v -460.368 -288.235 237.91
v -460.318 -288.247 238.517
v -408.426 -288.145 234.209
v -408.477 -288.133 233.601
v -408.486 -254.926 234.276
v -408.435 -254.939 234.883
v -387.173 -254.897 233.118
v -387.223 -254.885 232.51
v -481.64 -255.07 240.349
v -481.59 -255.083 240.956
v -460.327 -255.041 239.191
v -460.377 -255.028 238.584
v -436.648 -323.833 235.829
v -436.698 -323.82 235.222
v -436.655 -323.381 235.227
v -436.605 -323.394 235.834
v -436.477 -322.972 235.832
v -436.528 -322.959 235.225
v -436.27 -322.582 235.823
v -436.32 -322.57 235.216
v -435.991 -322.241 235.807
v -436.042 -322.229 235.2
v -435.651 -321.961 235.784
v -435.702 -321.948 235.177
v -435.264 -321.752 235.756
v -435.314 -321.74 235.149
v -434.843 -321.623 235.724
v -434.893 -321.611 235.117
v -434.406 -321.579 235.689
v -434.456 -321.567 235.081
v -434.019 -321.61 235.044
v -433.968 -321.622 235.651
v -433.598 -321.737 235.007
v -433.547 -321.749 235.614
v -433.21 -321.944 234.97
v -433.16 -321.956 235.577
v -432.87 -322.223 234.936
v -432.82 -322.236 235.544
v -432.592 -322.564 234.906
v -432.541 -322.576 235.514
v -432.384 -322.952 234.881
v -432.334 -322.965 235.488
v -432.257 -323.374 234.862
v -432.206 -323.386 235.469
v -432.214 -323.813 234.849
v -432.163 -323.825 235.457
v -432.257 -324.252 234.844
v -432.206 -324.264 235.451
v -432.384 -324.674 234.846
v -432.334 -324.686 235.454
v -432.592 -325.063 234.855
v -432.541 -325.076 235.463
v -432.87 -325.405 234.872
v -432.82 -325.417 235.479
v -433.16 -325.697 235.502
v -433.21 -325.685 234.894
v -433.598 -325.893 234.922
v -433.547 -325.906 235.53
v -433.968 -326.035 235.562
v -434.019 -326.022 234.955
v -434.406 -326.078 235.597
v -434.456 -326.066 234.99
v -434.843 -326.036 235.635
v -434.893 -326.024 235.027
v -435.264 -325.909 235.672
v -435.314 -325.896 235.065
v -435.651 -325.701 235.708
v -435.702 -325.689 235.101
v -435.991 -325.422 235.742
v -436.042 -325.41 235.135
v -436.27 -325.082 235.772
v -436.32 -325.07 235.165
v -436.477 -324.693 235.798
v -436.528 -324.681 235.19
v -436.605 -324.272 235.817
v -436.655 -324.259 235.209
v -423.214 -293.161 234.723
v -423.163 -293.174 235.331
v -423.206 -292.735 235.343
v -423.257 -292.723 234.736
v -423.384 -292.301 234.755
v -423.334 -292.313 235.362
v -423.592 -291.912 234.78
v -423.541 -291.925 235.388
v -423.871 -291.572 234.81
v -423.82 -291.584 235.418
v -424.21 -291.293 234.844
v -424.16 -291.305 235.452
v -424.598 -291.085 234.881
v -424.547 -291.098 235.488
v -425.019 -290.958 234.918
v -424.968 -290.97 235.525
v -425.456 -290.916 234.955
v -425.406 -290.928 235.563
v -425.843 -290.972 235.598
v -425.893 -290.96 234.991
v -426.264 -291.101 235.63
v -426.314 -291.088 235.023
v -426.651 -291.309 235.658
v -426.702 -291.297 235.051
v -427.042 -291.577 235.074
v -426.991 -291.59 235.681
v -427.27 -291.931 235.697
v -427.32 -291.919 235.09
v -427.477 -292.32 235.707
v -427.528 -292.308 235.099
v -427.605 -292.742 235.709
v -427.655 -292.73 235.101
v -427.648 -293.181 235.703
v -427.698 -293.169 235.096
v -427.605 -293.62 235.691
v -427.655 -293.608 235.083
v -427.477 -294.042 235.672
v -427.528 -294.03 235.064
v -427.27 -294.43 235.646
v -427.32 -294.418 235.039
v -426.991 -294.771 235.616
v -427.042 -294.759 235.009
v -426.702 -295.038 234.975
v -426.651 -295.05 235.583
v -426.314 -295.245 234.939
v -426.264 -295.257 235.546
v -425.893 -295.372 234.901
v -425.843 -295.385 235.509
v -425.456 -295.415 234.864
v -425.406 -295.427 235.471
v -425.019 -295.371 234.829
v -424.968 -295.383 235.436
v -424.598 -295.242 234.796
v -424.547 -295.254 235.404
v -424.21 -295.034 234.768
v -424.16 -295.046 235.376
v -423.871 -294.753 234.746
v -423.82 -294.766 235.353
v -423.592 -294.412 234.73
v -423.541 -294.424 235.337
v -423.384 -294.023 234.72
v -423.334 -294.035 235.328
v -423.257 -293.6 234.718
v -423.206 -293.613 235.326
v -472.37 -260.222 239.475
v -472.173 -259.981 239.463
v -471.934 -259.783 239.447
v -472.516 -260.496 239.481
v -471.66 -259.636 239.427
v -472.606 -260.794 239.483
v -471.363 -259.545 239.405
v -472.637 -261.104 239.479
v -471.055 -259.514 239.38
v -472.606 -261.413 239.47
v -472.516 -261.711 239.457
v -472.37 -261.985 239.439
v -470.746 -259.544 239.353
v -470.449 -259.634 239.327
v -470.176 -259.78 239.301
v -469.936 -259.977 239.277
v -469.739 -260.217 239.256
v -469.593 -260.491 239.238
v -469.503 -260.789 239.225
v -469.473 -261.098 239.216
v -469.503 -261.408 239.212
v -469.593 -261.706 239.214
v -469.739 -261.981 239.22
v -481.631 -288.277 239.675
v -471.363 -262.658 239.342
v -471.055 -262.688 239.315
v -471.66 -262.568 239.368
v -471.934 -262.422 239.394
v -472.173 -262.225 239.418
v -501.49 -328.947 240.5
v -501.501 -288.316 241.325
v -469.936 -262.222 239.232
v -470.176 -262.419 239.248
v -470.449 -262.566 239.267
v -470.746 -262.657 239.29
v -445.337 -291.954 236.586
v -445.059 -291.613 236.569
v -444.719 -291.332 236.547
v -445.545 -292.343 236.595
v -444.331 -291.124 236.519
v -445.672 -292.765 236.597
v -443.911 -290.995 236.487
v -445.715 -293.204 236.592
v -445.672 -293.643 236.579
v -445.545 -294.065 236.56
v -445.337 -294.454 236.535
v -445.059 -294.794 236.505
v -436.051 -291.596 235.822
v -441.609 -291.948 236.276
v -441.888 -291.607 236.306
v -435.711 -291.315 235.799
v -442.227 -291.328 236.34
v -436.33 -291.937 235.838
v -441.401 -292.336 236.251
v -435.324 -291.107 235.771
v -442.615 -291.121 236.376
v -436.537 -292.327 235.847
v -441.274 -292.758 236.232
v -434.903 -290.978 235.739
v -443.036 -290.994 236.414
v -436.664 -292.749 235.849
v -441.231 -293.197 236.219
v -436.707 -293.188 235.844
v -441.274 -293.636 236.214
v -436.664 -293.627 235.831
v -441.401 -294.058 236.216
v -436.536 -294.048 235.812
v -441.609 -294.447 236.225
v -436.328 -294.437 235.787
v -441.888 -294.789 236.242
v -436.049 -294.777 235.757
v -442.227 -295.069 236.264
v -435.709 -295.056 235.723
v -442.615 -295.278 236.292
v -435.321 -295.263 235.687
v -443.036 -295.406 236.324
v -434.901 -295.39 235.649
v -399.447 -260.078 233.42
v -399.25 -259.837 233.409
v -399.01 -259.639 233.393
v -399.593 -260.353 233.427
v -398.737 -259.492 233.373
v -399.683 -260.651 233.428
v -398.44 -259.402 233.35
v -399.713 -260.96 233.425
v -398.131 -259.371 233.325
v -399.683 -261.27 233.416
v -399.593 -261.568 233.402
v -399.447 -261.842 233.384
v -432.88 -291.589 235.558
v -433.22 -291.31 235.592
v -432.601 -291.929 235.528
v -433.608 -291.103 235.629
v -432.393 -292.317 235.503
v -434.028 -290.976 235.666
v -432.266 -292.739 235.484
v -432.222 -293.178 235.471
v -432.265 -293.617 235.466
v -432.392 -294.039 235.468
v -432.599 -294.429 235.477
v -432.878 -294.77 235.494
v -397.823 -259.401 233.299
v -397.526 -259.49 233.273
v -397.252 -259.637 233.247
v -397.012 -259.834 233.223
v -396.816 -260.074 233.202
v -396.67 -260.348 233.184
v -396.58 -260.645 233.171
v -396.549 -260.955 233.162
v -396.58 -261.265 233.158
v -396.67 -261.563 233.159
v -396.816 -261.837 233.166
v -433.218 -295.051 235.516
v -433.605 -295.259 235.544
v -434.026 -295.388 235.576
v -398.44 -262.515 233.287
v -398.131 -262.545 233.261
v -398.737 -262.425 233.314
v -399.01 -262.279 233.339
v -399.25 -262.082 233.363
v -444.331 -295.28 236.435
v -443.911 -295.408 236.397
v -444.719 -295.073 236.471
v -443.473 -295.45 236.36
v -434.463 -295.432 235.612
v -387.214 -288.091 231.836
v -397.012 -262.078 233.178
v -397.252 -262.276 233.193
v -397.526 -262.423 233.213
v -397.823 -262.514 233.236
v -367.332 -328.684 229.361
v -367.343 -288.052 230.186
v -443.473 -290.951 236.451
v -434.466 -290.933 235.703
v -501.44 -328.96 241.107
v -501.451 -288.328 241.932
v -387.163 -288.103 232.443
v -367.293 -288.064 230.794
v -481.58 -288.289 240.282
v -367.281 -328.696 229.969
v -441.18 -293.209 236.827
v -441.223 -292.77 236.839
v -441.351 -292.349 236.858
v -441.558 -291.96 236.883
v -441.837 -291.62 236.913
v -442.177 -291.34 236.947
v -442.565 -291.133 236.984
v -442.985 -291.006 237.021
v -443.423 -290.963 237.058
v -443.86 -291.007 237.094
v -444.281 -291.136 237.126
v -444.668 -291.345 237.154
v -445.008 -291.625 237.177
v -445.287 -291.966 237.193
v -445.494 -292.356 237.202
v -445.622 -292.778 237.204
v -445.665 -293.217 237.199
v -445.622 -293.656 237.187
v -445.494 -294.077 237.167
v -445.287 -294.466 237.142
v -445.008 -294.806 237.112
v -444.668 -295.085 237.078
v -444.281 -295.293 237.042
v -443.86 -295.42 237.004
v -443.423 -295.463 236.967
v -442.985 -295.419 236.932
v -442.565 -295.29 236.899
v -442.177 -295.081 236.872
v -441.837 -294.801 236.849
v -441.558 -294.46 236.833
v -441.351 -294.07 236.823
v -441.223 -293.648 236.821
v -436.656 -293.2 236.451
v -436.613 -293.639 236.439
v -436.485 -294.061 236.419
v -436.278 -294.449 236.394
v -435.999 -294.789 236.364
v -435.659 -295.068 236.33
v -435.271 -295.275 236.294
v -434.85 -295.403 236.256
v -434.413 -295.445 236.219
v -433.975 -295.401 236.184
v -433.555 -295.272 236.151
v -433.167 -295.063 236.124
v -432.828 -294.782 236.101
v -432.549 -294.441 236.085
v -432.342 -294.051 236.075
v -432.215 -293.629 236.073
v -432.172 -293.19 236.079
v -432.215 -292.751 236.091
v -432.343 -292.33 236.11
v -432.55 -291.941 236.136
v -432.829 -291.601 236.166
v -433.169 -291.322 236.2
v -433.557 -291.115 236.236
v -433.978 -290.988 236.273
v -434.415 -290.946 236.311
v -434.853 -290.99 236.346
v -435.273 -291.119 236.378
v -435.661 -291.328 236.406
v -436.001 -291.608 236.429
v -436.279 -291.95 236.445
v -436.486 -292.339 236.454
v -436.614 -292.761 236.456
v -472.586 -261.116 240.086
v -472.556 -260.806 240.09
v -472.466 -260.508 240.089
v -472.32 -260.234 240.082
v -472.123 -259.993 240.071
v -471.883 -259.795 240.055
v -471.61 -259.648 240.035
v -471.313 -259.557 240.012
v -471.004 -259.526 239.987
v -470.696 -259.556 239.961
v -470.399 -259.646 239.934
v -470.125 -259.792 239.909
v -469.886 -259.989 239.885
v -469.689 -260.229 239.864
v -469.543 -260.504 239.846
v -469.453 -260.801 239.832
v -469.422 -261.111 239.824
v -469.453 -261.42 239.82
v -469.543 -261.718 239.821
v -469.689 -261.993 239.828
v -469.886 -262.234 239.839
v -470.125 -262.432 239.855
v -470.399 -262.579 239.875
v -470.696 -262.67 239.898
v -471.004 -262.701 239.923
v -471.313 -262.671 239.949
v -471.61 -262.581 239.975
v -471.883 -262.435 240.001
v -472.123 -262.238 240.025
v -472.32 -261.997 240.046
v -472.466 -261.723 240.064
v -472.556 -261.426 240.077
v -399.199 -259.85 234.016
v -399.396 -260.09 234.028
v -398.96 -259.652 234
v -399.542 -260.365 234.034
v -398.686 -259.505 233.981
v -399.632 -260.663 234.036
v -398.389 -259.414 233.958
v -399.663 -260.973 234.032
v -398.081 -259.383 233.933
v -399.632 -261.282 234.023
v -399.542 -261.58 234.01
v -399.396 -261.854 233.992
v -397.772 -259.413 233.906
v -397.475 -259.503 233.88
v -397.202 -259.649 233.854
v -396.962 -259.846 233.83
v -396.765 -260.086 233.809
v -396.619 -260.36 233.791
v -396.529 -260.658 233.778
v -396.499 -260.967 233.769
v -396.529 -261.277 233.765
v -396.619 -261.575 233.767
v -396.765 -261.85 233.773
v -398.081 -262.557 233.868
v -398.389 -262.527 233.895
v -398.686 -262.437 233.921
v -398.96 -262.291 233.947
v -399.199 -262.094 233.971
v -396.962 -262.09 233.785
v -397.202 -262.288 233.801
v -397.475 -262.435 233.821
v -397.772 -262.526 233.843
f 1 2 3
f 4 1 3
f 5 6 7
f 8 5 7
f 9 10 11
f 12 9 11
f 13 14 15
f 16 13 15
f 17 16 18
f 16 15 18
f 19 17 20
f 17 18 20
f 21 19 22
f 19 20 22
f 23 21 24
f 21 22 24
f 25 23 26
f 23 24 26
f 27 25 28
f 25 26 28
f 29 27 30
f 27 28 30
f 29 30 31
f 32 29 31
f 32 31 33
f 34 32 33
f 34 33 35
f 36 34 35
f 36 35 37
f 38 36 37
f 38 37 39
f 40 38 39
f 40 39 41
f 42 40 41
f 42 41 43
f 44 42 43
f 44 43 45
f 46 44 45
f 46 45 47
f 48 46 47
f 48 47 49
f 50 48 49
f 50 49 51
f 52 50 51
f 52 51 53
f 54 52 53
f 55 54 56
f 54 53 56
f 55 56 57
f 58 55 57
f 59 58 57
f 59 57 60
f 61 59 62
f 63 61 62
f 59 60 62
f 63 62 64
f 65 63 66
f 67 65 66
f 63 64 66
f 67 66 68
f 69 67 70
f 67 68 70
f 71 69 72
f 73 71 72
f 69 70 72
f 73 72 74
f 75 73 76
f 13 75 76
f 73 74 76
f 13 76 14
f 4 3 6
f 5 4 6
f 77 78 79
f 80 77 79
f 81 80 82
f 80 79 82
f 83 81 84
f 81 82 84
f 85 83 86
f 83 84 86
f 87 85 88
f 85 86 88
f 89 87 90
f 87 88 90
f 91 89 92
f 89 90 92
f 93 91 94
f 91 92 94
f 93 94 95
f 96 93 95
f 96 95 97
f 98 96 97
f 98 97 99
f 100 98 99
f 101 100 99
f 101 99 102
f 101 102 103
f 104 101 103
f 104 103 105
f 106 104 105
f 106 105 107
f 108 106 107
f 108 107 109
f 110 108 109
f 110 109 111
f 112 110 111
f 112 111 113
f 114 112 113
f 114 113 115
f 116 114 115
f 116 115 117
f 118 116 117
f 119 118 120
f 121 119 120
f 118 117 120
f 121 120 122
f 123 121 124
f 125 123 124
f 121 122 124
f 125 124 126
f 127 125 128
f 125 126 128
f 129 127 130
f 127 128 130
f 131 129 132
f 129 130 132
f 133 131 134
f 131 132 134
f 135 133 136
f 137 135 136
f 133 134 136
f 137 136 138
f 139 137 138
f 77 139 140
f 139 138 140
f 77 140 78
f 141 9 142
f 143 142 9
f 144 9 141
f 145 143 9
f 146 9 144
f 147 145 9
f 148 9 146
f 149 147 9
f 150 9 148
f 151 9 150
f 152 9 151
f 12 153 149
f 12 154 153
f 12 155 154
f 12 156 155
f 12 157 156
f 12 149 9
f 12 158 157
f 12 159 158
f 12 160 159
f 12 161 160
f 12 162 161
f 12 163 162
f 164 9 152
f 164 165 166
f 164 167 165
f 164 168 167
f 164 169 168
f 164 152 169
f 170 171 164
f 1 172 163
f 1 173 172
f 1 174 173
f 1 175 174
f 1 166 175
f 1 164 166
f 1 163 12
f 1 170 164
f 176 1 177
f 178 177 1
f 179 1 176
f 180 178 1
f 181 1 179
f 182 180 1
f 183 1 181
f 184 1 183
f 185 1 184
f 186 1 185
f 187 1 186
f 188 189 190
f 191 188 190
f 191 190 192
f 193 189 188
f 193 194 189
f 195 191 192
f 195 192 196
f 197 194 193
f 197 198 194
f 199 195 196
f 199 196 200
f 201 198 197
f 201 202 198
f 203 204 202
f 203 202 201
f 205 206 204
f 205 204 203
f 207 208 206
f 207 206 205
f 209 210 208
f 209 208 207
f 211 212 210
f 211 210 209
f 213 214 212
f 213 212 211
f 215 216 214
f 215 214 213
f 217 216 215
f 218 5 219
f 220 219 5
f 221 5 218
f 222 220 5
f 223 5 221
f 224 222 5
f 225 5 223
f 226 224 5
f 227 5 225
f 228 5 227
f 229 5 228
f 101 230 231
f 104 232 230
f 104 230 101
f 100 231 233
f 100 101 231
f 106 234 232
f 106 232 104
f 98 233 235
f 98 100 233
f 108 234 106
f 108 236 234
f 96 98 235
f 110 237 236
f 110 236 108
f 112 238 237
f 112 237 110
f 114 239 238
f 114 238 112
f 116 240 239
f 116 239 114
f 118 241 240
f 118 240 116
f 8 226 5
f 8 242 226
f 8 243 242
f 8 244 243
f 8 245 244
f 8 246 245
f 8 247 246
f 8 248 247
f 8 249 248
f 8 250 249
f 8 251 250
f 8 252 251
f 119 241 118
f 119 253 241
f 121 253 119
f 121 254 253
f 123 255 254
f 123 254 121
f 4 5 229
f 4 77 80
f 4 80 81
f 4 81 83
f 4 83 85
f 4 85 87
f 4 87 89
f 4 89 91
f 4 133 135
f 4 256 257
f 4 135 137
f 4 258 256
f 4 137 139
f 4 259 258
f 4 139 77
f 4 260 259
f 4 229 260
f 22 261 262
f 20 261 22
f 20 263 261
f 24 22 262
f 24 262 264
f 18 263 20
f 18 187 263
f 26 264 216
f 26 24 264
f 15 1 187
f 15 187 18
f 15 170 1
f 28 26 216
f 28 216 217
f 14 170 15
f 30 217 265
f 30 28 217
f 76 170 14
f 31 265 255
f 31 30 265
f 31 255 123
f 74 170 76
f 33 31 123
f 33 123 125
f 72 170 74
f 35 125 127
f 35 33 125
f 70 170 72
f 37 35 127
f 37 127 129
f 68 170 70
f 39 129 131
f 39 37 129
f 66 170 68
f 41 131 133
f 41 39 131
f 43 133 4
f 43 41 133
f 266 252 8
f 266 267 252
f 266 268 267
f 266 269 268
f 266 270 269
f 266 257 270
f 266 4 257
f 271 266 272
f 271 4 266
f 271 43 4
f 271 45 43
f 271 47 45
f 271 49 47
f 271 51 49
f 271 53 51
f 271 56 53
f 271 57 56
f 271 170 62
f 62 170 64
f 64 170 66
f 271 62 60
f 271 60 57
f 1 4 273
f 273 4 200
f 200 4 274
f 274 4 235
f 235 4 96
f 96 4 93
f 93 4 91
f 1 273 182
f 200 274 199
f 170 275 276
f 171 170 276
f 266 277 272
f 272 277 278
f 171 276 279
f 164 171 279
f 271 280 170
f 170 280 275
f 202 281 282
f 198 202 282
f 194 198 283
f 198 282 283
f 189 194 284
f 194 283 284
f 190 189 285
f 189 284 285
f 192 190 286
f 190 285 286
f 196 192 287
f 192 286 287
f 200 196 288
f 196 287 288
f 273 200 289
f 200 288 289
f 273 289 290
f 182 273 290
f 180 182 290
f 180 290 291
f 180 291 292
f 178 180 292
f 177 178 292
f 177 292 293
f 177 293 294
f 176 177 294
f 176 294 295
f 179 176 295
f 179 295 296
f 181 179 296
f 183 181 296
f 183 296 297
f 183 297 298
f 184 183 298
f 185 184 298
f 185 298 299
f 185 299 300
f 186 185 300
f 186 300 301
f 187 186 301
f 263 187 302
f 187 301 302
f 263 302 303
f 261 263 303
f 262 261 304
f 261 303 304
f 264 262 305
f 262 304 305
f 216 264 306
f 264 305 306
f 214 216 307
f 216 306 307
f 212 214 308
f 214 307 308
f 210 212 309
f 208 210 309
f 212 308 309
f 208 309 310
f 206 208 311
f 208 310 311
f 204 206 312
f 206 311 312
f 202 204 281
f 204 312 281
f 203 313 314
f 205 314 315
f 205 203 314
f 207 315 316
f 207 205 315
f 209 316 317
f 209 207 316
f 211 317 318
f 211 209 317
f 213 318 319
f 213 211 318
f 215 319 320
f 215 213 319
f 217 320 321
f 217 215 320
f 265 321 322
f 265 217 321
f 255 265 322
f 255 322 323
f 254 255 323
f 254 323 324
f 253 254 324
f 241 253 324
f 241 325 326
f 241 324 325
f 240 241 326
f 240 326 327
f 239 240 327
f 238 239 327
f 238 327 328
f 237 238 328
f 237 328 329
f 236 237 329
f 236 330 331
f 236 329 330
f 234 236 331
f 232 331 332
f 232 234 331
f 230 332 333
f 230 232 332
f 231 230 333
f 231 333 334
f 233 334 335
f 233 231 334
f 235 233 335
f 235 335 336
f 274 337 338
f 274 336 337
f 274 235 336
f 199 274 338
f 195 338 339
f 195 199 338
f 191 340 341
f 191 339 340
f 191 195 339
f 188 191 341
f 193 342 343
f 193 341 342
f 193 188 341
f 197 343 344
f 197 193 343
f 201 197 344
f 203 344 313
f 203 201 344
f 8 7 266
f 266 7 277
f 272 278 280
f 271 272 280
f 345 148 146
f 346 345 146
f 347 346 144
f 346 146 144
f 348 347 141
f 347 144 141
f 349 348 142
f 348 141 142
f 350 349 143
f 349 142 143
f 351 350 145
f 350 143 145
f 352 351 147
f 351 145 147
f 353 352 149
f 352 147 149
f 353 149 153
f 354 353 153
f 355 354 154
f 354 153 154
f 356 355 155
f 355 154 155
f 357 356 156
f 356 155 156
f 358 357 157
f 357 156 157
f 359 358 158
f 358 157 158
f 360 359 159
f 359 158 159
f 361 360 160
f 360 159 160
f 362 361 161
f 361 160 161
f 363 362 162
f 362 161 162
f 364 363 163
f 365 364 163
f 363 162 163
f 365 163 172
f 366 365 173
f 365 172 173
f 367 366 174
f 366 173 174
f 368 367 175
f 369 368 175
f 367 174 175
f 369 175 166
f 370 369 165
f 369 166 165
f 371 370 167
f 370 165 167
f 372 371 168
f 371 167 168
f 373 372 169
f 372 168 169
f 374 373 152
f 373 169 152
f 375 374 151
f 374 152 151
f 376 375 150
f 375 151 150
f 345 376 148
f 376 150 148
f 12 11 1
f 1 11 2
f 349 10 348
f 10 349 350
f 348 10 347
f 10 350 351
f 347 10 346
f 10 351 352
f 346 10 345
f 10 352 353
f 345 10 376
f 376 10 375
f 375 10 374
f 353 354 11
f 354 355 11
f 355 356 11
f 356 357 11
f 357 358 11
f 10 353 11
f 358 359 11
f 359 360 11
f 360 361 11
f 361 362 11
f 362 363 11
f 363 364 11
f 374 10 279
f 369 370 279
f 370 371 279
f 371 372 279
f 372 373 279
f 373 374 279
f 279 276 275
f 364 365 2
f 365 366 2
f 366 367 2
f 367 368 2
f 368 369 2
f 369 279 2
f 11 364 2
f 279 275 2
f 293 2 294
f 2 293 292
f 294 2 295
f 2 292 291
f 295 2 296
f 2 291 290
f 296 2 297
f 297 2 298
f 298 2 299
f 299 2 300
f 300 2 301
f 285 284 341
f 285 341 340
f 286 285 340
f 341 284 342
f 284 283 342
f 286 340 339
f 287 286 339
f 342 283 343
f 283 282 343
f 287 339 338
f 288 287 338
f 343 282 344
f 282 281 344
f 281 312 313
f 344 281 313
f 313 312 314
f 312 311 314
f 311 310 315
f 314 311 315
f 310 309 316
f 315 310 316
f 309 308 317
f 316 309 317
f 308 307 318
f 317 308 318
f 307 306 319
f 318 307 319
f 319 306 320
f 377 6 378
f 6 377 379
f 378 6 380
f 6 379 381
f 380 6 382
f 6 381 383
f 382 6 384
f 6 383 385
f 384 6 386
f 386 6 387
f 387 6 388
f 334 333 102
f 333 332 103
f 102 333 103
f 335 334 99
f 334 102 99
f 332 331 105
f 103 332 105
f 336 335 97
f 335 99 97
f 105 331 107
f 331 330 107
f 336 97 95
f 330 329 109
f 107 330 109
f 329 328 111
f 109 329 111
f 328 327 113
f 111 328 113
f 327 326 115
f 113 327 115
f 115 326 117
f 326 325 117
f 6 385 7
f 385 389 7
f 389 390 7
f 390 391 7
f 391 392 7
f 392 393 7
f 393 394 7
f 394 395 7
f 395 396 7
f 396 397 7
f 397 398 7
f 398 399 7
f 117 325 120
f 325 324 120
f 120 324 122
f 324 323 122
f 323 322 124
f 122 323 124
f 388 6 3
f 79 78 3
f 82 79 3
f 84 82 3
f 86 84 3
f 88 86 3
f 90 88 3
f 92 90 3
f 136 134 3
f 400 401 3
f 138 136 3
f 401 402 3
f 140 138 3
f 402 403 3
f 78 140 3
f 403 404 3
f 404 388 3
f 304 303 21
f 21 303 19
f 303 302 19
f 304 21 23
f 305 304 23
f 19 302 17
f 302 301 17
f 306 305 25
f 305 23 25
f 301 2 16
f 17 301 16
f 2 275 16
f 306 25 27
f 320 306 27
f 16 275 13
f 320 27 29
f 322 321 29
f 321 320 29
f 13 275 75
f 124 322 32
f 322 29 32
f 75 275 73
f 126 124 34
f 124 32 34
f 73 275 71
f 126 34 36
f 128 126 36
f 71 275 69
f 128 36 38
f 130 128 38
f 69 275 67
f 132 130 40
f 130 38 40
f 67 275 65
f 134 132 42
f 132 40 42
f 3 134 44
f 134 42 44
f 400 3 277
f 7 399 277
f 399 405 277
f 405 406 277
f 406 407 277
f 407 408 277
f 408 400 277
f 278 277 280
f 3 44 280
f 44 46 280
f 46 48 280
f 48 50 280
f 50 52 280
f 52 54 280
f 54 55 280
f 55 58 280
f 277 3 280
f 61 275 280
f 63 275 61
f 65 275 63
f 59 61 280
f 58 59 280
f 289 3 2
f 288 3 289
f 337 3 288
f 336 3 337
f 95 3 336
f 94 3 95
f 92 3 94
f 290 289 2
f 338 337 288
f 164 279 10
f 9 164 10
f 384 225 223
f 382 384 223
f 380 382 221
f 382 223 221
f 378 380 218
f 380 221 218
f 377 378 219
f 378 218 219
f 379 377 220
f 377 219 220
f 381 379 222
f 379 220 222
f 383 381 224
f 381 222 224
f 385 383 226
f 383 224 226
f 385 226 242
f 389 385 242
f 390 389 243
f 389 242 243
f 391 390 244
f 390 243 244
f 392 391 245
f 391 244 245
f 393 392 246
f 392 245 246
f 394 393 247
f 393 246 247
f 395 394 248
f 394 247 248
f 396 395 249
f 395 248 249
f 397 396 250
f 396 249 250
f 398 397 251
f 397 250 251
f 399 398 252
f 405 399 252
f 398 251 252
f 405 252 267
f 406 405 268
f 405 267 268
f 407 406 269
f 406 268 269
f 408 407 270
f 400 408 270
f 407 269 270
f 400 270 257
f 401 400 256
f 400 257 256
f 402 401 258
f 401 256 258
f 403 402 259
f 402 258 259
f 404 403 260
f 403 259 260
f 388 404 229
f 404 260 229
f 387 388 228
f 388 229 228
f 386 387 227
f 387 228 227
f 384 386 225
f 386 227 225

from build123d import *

# Parameters (mm, degrees)
BOSS_EXTRUDE1_DEPTH = 0.6096
SKETCH5_R           = 2.25
CUT_EXTRUDE2_DEPTH  = 430.420105
SKETCH6_R           = 1.5875
CUT_EXTRUDE5_DEPTH  = 0.6096
SKETCH7_R           = 1.5875
CUT_EXTRUDE6_DEPTH  = 0.6096
SKETCH8_R           = 2.25
CUT_EXTRUDE7_DEPTH  = 2.54


with BuildPart() as part:
    # Sketch1 → Boss-Extrude1 (new body)
    with BuildSketch(Plane(origin=(16.997226787, -4.149929847, 204.631375634), x_dir=(0.99656941, 0.00195951, -0.082737969), z_dir=(-0.082760694, 0.020206301, -0.996364578))):
        Polygon((-405.631572024, 283.216979703), (-385.692572024, 283.216979703), (-385.692572024, 323.856979703), (-405.014358213, 323.856979703), (-432.414358217, 323.856979703), (-445.097076418, 323.856979703), (-465.359895626, 323.856979703), (-479.498480719, 323.856979703), (-500.373572024, 323.856979703), (-520.312572024, 323.856979703), (-520.312572024, 283.216979703), (-500.373572024, 283.216979703), (-500.373572024, 250.003685703), (-479.037572024, 250.003685703), (-479.037572024, 283.216979703), (-426.967572024, 283.216979703), (-426.967572024, 250.003685703), (-405.631572024, 250.003685703), align=None)
    extrude(amount=BOSS_EXTRUDE1_DEPTH)

    # Sketch5 → Cut-Extrude2 (cut)
    with BuildSketch(Plane(origin=(16.946775868, -4.137612086, 204.023991787), x_dir=(-0.996569449, -0.001678044, 0.082743681), z_dir=(-0.082760694, 0.020206301, -0.996364578))):
        with Locations((452.956635294, -318.984510283)):
            Circle(SKETCH5_R)
    cut_extrude2 = extrude(amount=-CUT_EXTRUDE2_DEPTH, mode=Mode.SUBTRACT)

    # Mirror1: Cut-Extrude2 across plane
    add(cut_extrude2.mirror(Plane(origin=(0.085159645, -303.474424262, -6.16154314), x_dir=(5.696e-06, -0.020299151, 0.999793951), z_dir=(0.000280558, -0.999793912, -0.020299152))), mode=Mode.SUBTRACT)

    # Sketch6 → Cut-Extrude5 (cut)
    with BuildSketch(Plane(origin=(16.946775868, -4.137612086, 204.023991787), x_dir=(-0.996569449, -0.001678044, 0.082743681), z_dir=(-0.082760694, 0.020206301, -0.996364578))):
        with Locations((416.50680125, -256.173836565)):
            Circle(SKETCH6_R)
    extrude(amount=-CUT_EXTRUDE5_DEPTH, mode=Mode.SUBTRACT)

    # Sketch7 → Cut-Extrude6 (cut)
    with BuildSketch(Plane(origin=(16.946775868, -4.137612086, 204.023991787), x_dir=(-0.996569449, -0.001678044, 0.082743681), z_dir=(-0.082760694, 0.020206301, -0.996364578))):
        with Locations((489.681466673, -256.194436956)):
            Circle(SKETCH7_R)
    extrude(amount=-CUT_EXTRUDE6_DEPTH, mode=Mode.SUBTRACT)

    # Sketch8 → Cut-Extrude7 (cut)
    with BuildSketch(Plane(origin=(16.997226787, -4.149929847, 204.631375634), x_dir=(0.996569449, 0.001678044, -0.082743681), z_dir=(0.082760694, -0.020206301, 0.996364578))):
        with Locations((-443.925718519, -288.341966658)):
            Circle(SKETCH8_R)
        with Locations((-960.270444462, 120.825542597)):
            Circle(SKETCH8_R)
        with Locations((-462.00480383, -288.347056346)):
            Circle(SKETCH8_R)
    extrude(amount=-CUT_EXTRUDE7_DEPTH, mode=Mode.SUBTRACT)


solid = part.part
